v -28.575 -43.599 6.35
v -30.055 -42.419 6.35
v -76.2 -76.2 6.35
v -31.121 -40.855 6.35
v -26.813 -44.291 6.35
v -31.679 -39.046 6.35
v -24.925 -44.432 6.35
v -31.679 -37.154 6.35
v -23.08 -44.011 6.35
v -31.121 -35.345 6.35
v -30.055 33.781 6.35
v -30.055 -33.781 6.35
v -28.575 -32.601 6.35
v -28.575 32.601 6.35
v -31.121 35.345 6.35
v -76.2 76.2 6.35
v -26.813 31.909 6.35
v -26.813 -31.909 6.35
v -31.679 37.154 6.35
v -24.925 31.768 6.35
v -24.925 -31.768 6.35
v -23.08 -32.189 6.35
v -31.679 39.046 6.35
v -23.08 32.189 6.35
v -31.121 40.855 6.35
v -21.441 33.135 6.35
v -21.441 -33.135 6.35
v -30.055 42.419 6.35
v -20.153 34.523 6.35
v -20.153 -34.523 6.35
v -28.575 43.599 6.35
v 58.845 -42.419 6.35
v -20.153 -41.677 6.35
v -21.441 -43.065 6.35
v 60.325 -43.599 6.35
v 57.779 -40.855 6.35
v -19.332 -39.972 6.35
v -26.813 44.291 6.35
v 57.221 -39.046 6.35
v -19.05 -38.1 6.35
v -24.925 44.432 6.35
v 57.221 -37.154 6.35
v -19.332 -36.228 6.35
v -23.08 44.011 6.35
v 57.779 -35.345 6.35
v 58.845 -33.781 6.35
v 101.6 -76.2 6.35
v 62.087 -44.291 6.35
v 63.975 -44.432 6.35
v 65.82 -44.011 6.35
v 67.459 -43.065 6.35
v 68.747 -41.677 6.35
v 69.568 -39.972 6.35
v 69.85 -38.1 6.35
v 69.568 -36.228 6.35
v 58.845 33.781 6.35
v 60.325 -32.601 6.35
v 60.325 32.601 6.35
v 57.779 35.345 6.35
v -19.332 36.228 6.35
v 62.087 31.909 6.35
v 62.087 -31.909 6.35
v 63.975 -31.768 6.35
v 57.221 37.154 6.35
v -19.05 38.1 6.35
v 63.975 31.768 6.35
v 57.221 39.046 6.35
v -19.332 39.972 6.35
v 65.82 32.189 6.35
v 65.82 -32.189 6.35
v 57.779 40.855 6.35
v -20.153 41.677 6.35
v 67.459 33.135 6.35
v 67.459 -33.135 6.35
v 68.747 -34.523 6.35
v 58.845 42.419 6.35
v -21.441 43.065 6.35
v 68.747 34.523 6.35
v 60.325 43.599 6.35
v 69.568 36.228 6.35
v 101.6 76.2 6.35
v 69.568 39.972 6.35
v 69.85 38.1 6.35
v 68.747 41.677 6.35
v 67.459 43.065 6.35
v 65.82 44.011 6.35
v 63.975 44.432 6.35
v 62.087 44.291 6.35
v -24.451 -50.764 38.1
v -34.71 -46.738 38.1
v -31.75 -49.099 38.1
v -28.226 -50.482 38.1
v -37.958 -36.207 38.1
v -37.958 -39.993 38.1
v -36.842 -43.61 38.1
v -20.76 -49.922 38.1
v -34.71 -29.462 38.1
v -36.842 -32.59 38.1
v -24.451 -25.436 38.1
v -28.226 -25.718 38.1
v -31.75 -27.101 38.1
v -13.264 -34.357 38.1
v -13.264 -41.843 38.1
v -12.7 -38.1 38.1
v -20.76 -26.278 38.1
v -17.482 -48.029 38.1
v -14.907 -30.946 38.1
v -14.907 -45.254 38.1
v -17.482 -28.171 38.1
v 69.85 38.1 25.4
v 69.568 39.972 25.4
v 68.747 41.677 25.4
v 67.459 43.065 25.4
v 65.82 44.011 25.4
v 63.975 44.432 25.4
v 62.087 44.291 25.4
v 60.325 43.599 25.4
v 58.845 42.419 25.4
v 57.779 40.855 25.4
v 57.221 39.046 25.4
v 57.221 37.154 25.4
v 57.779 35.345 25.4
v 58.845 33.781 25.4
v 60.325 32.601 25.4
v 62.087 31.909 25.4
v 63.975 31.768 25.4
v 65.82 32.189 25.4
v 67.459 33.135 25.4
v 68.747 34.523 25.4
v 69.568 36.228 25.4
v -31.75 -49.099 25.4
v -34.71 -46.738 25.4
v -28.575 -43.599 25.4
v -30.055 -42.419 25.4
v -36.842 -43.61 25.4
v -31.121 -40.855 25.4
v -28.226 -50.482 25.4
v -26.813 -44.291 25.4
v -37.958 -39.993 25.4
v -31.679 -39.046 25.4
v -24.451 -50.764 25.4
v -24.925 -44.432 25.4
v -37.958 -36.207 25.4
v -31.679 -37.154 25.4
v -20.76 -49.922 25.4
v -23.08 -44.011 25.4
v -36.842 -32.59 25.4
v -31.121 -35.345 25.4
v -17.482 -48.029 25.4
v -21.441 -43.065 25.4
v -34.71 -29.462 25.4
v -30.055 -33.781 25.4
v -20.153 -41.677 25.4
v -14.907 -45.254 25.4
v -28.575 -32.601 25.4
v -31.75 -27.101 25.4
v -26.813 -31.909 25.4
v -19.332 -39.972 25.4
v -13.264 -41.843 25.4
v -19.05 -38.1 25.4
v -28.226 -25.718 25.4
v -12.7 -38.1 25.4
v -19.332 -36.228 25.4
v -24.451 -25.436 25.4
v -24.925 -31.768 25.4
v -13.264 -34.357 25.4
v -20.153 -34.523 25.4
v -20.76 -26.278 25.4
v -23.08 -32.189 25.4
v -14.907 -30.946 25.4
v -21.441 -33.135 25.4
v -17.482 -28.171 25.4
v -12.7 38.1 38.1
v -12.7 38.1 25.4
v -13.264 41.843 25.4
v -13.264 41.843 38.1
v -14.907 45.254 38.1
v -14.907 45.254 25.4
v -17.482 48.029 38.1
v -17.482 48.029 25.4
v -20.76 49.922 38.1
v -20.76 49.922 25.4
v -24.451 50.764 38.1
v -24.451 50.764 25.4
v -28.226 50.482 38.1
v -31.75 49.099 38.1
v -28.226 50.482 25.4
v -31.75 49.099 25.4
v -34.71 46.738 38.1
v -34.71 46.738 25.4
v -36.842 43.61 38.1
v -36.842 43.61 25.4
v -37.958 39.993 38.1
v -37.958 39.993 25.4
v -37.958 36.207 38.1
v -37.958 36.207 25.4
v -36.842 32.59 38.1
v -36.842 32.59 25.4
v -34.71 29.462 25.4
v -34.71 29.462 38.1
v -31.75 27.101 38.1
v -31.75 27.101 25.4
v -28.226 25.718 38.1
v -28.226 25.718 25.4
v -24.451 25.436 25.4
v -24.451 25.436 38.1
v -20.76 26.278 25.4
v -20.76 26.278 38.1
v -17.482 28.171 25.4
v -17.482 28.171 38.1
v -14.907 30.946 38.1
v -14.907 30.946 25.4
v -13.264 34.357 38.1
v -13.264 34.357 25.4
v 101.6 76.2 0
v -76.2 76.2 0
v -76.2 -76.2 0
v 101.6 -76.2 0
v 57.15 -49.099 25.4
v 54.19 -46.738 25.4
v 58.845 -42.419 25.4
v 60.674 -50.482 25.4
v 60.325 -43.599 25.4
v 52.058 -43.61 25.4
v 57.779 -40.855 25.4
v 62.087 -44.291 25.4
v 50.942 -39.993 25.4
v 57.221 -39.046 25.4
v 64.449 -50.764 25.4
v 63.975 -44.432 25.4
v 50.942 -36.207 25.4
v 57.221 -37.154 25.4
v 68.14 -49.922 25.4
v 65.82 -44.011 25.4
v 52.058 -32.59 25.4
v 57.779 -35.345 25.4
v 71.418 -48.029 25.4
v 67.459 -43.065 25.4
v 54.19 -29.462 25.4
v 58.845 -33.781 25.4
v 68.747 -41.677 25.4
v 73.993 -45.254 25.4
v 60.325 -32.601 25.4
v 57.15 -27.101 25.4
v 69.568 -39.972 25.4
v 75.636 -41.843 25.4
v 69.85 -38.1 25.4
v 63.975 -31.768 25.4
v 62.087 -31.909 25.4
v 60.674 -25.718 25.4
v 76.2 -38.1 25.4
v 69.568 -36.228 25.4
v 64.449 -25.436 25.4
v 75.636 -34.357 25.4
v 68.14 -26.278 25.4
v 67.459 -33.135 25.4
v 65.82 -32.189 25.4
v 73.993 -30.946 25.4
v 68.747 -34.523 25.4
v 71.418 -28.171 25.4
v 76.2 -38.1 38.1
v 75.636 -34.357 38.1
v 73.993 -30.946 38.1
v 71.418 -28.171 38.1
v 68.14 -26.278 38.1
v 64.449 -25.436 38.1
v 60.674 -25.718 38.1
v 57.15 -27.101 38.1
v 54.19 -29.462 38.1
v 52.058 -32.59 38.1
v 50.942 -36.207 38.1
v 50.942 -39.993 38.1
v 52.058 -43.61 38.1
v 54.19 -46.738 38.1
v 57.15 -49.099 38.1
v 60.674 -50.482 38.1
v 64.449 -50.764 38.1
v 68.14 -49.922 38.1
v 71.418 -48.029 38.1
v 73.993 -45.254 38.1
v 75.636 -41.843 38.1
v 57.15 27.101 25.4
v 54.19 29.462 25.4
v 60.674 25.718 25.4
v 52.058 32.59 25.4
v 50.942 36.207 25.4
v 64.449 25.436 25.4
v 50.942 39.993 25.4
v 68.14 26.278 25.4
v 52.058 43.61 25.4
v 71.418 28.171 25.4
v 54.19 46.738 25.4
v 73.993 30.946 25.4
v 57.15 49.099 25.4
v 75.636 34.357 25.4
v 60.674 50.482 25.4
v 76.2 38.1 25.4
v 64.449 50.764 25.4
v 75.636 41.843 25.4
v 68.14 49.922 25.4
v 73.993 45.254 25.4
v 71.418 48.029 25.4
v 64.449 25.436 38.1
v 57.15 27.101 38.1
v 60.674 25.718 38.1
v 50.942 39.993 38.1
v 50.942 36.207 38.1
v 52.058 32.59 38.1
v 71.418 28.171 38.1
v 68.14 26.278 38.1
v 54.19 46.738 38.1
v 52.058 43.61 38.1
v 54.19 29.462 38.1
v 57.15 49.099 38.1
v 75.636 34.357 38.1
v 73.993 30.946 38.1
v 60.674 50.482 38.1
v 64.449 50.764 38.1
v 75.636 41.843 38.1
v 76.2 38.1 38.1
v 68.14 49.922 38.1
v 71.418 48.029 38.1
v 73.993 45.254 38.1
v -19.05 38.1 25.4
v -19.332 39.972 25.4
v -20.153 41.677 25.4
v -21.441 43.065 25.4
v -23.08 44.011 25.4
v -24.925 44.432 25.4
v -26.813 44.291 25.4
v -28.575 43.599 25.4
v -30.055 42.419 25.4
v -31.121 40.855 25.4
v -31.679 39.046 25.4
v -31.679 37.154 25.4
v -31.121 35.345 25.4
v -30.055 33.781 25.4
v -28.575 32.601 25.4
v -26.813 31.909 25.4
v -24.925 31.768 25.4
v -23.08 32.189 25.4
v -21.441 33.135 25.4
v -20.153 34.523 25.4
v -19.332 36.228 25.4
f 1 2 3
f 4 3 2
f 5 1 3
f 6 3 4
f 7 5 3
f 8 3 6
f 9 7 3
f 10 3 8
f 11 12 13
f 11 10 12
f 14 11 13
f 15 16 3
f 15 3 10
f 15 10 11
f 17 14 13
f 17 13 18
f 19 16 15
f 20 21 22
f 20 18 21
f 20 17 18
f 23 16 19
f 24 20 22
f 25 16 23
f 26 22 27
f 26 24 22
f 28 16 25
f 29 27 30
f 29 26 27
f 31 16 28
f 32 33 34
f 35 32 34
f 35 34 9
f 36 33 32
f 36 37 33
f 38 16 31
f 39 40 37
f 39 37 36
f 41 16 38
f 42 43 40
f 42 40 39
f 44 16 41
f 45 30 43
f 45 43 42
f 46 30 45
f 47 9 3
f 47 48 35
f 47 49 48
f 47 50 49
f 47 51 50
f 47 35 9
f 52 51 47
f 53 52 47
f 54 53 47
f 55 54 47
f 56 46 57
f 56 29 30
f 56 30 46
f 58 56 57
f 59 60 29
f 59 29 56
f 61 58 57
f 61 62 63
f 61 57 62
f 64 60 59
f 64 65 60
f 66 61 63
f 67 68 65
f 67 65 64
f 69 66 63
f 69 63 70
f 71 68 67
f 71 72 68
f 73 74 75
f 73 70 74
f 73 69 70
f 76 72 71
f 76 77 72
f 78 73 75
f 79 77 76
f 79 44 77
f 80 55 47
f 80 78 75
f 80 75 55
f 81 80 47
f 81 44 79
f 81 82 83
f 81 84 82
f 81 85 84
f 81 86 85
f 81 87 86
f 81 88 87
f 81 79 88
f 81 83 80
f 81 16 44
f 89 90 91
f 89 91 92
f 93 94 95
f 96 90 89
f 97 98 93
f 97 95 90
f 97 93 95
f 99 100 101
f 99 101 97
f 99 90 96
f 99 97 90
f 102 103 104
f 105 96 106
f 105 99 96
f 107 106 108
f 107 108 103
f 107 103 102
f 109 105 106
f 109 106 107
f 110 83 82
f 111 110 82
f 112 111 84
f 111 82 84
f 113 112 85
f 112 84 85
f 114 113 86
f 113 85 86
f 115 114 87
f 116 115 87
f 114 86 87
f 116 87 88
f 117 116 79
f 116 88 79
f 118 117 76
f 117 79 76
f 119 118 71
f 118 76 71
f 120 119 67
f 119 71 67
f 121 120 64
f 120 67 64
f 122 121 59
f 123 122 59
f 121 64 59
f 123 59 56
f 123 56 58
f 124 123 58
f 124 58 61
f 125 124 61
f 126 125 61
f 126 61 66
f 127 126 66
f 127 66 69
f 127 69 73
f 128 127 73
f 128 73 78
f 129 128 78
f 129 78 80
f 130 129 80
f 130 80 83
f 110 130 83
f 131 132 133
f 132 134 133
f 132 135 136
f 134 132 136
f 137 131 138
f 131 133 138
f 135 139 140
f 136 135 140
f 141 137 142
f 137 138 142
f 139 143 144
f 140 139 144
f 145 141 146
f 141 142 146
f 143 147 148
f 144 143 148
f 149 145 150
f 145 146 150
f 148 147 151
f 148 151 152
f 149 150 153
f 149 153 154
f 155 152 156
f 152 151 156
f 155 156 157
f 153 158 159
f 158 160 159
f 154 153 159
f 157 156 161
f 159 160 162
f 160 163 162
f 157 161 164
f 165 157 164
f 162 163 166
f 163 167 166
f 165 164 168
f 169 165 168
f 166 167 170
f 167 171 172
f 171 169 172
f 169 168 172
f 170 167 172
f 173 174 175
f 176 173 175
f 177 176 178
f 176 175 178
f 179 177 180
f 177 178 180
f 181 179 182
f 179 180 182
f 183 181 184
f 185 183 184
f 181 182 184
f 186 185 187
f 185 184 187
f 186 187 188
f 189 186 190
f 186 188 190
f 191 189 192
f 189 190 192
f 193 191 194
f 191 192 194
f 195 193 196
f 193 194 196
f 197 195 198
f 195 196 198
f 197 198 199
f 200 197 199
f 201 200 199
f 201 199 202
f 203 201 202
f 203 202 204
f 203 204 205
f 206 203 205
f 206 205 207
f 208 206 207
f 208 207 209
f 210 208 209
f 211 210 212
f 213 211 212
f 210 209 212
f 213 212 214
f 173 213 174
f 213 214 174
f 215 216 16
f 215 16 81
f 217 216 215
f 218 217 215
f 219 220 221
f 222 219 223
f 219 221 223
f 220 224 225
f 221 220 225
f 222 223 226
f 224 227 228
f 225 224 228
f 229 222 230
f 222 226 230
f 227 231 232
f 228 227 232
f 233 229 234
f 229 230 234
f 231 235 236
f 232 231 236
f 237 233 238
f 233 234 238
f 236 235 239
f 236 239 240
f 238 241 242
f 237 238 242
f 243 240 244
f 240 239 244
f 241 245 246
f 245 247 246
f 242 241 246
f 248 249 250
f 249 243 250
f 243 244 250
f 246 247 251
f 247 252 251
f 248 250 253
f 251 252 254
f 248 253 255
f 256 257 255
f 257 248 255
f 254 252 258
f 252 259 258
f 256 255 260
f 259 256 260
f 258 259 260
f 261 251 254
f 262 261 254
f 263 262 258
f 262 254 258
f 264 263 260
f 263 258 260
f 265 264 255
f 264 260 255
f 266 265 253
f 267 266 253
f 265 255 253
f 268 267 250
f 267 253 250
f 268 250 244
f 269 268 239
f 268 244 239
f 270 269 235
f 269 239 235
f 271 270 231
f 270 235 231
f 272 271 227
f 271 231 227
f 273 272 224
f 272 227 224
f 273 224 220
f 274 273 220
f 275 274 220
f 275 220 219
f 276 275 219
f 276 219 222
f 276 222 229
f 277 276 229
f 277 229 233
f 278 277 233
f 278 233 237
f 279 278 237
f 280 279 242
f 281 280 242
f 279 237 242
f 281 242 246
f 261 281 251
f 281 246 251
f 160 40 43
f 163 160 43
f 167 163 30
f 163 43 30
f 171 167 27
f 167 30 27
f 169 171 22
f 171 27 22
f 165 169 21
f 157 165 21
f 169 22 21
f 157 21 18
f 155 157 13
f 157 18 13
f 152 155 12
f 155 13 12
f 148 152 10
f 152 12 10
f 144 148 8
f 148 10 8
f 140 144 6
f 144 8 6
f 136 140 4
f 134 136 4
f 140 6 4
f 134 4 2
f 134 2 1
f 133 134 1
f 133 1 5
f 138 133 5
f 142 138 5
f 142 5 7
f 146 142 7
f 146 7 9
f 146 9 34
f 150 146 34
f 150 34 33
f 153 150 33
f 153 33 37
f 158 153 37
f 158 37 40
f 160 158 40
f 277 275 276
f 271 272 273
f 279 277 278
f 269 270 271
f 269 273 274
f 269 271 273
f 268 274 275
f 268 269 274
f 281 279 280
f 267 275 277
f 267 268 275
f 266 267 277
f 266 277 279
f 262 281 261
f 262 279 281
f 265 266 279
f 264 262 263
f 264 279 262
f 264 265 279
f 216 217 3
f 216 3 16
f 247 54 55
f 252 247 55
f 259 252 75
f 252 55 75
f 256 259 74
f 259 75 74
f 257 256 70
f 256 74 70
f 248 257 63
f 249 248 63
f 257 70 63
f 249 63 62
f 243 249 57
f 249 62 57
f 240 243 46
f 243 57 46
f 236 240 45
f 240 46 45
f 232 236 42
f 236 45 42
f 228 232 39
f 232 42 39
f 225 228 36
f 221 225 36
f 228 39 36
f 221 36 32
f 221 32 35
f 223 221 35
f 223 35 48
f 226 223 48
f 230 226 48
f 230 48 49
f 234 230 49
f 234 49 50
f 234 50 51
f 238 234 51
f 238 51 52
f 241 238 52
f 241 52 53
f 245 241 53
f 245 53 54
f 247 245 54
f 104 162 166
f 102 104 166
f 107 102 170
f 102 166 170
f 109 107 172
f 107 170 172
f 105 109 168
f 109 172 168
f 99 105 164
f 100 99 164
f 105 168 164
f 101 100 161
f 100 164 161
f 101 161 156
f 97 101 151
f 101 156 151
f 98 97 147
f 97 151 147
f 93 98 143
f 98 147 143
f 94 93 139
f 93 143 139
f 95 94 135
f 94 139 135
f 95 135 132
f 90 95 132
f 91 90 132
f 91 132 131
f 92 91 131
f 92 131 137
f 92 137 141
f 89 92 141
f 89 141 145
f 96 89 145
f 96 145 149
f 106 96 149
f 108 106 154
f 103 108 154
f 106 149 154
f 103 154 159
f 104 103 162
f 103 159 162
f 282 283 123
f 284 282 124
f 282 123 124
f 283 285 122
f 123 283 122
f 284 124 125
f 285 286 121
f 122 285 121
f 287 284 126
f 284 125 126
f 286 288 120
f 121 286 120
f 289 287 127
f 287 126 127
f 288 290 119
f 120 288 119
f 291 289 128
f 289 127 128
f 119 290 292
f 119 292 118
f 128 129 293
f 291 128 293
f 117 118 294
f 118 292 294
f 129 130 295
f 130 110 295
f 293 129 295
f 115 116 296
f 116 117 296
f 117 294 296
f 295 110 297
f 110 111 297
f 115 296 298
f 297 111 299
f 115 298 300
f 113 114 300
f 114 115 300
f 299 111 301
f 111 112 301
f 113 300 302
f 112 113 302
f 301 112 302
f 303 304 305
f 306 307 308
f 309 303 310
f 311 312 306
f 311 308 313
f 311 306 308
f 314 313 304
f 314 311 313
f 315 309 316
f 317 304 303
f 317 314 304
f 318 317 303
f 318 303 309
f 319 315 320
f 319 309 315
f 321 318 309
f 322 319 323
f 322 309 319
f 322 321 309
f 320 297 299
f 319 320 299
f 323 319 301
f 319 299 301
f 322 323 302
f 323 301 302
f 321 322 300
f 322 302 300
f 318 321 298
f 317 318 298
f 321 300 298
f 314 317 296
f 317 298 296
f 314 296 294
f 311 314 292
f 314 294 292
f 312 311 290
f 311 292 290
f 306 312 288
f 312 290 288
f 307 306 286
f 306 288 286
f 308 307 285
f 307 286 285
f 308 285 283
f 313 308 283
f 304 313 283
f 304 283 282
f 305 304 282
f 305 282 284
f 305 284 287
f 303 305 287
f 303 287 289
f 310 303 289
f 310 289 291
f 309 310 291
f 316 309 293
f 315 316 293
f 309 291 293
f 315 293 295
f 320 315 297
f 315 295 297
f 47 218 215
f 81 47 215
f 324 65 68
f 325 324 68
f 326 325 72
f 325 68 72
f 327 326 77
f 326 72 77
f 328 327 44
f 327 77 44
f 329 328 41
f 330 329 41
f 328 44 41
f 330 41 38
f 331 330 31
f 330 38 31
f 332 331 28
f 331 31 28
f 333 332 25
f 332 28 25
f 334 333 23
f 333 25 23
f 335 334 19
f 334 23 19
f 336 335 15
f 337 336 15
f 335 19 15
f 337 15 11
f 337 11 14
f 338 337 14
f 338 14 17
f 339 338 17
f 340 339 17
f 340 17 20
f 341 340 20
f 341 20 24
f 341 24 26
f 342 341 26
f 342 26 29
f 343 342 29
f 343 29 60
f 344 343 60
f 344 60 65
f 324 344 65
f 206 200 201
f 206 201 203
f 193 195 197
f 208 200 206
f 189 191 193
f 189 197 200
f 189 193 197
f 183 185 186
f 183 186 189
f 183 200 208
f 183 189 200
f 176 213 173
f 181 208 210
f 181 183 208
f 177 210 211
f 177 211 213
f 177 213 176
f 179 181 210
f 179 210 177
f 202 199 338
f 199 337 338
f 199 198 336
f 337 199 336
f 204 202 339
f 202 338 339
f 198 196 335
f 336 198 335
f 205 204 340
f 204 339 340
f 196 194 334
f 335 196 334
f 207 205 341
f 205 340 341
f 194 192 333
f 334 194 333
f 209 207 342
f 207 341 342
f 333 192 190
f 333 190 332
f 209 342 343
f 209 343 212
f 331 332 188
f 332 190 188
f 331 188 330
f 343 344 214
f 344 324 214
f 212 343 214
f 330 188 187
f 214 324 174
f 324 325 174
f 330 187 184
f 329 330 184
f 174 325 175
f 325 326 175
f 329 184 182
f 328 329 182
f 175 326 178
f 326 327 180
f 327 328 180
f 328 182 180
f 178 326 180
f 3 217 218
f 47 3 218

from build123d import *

# Parameters (mm, degrees)
F1_START = 25.4
F0_R     = 12.7
F0_R_2   = 6.35
F1_DEPTH = 12.7
F2_DEPTH = 25.4
F0_W     = 177.8
F0_H     = 152.4
F3_DEPTH = 6.35


with BuildPart() as f1:
    # F0 (on Top) → F1 (new body)
    with BuildSketch(Plane.XY.offset(F1_START)):
        with Locations((-25.4, 38.1)):
            Circle(F0_R)
        with Locations((-25.4, 38.1)):
            Circle(F0_R_2, mode=Mode.SUBTRACT)
        with Locations((-25.4, 38.1)):
            Circle(F0_R_2)
    extrude(amount=F1_DEPTH)

    # F0 (on Top) → F2, piece 2 (join)
    with BuildSketch(Plane.XY):
        with Locations((-25.4, 38.1)):
            Circle(F0_R_2)
    extrude(amount=F2_DEPTH)



with BuildPart() as f1b:
    # F0 (on Top) → F1, piece 2 (new body)
    with BuildSketch(Plane.XY.offset(F1_START)):
        with Locations((63.5, 38.1)):
            Circle(F0_R)
        with Locations((63.5, 38.1)):
            Circle(F0_R_2, mode=Mode.SUBTRACT)
        with Locations((63.5, 38.1)):
            Circle(F0_R_2)
    extrude(amount=F1_DEPTH)

    # F0 (on Top) → F2 (join)
    with BuildSketch(Plane.XY):
        with Locations((63.5, 38.1)):
            Circle(F0_R_2)
    extrude(amount=F2_DEPTH)


with BuildPart() as f1c:
    # F0 (on Top) → F1, piece 3 (new body)
    with BuildSketch(Plane.XY.offset(F1_START)):
        with Locations((-25.4, -38.1)):
            Circle(F0_R)
        with Locations((-25.4, -38.1)):
            Circle(F0_R_2, mode=Mode.SUBTRACT)
        with Locations((-25.4, -38.1)):
            Circle(F0_R_2)
    extrude(amount=F1_DEPTH)

    # F0 (on Top) → F2, piece 3 (join)
    with BuildSketch(Plane.XY):
        with Locations((-25.4, -38.1)):
            Circle(F0_R_2)
    extrude(amount=F2_DEPTH)


with BuildPart() as f1d:
    # F0 (on Top) → F1, piece 4 (new body)
    with BuildSketch(Plane.XY.offset(F1_START)):
        with Locations((63.5, -38.1)):
            Circle(F0_R)
        with Locations((63.5, -38.1)):
            Circle(F0_R_2, mode=Mode.SUBTRACT)
        with Locations((63.5, -38.1)):
            Circle(F0_R_2)
    extrude(amount=F1_DEPTH)

    # F0 (on Top) → F2, piece 4 (join)
    with BuildSketch(Plane.XY):
        with Locations((63.5, -38.1)):
            Circle(F0_R_2)
    extrude(amount=F2_DEPTH)


with BuildPart() as f1_1:
    add(f1.part)

    add(f1b.part)  # F3 merges F1b

    add(f1c.part)  # F3 merges F1c

    add(f1d.part)  # F3 merges F1d
    # F0 (on Top) → F3 (join)
    with BuildSketch(Plane.XY):
        with Locations((12.7, 0)):
            Rectangle(F0_W, F0_H)
        with Locations((-25.4, -38.1)):
            Circle(F0_R, mode=Mode.SUBTRACT)
        with Locations((63.5, -38.1)):
            Circle(F0_R, mode=Mode.SUBTRACT)
        with Locations((-25.4, 38.1)):
            Circle(F0_R, mode=Mode.SUBTRACT)
        with Locations((63.5, 38.1)):
            Circle(F0_R, mode=Mode.SUBTRACT)
        with Locations((63.5, 38.1)):
            Circle(F0_R)
        with Locations((63.5, 38.1)):
            Circle(F0_R_2, mode=Mode.SUBTRACT)
        with Locations((-25.4, 38.1)):
            Circle(F0_R)
        with Locations((-25.4, 38.1)):
            Circle(F0_R_2, mode=Mode.SUBTRACT)
        with Locations((-25.4, -38.1)):
            Circle(F0_R)
        with Locations((-25.4, -38.1)):
            Circle(F0_R_2, mode=Mode.SUBTRACT)
        with Locations((63.5, -38.1)):
            Circle(F0_R)
        with Locations((63.5, -38.1)):
            Circle(F0_R_2, mode=Mode.SUBTRACT)
    extrude(amount=F3_DEPTH)


solid = f1_1.part
